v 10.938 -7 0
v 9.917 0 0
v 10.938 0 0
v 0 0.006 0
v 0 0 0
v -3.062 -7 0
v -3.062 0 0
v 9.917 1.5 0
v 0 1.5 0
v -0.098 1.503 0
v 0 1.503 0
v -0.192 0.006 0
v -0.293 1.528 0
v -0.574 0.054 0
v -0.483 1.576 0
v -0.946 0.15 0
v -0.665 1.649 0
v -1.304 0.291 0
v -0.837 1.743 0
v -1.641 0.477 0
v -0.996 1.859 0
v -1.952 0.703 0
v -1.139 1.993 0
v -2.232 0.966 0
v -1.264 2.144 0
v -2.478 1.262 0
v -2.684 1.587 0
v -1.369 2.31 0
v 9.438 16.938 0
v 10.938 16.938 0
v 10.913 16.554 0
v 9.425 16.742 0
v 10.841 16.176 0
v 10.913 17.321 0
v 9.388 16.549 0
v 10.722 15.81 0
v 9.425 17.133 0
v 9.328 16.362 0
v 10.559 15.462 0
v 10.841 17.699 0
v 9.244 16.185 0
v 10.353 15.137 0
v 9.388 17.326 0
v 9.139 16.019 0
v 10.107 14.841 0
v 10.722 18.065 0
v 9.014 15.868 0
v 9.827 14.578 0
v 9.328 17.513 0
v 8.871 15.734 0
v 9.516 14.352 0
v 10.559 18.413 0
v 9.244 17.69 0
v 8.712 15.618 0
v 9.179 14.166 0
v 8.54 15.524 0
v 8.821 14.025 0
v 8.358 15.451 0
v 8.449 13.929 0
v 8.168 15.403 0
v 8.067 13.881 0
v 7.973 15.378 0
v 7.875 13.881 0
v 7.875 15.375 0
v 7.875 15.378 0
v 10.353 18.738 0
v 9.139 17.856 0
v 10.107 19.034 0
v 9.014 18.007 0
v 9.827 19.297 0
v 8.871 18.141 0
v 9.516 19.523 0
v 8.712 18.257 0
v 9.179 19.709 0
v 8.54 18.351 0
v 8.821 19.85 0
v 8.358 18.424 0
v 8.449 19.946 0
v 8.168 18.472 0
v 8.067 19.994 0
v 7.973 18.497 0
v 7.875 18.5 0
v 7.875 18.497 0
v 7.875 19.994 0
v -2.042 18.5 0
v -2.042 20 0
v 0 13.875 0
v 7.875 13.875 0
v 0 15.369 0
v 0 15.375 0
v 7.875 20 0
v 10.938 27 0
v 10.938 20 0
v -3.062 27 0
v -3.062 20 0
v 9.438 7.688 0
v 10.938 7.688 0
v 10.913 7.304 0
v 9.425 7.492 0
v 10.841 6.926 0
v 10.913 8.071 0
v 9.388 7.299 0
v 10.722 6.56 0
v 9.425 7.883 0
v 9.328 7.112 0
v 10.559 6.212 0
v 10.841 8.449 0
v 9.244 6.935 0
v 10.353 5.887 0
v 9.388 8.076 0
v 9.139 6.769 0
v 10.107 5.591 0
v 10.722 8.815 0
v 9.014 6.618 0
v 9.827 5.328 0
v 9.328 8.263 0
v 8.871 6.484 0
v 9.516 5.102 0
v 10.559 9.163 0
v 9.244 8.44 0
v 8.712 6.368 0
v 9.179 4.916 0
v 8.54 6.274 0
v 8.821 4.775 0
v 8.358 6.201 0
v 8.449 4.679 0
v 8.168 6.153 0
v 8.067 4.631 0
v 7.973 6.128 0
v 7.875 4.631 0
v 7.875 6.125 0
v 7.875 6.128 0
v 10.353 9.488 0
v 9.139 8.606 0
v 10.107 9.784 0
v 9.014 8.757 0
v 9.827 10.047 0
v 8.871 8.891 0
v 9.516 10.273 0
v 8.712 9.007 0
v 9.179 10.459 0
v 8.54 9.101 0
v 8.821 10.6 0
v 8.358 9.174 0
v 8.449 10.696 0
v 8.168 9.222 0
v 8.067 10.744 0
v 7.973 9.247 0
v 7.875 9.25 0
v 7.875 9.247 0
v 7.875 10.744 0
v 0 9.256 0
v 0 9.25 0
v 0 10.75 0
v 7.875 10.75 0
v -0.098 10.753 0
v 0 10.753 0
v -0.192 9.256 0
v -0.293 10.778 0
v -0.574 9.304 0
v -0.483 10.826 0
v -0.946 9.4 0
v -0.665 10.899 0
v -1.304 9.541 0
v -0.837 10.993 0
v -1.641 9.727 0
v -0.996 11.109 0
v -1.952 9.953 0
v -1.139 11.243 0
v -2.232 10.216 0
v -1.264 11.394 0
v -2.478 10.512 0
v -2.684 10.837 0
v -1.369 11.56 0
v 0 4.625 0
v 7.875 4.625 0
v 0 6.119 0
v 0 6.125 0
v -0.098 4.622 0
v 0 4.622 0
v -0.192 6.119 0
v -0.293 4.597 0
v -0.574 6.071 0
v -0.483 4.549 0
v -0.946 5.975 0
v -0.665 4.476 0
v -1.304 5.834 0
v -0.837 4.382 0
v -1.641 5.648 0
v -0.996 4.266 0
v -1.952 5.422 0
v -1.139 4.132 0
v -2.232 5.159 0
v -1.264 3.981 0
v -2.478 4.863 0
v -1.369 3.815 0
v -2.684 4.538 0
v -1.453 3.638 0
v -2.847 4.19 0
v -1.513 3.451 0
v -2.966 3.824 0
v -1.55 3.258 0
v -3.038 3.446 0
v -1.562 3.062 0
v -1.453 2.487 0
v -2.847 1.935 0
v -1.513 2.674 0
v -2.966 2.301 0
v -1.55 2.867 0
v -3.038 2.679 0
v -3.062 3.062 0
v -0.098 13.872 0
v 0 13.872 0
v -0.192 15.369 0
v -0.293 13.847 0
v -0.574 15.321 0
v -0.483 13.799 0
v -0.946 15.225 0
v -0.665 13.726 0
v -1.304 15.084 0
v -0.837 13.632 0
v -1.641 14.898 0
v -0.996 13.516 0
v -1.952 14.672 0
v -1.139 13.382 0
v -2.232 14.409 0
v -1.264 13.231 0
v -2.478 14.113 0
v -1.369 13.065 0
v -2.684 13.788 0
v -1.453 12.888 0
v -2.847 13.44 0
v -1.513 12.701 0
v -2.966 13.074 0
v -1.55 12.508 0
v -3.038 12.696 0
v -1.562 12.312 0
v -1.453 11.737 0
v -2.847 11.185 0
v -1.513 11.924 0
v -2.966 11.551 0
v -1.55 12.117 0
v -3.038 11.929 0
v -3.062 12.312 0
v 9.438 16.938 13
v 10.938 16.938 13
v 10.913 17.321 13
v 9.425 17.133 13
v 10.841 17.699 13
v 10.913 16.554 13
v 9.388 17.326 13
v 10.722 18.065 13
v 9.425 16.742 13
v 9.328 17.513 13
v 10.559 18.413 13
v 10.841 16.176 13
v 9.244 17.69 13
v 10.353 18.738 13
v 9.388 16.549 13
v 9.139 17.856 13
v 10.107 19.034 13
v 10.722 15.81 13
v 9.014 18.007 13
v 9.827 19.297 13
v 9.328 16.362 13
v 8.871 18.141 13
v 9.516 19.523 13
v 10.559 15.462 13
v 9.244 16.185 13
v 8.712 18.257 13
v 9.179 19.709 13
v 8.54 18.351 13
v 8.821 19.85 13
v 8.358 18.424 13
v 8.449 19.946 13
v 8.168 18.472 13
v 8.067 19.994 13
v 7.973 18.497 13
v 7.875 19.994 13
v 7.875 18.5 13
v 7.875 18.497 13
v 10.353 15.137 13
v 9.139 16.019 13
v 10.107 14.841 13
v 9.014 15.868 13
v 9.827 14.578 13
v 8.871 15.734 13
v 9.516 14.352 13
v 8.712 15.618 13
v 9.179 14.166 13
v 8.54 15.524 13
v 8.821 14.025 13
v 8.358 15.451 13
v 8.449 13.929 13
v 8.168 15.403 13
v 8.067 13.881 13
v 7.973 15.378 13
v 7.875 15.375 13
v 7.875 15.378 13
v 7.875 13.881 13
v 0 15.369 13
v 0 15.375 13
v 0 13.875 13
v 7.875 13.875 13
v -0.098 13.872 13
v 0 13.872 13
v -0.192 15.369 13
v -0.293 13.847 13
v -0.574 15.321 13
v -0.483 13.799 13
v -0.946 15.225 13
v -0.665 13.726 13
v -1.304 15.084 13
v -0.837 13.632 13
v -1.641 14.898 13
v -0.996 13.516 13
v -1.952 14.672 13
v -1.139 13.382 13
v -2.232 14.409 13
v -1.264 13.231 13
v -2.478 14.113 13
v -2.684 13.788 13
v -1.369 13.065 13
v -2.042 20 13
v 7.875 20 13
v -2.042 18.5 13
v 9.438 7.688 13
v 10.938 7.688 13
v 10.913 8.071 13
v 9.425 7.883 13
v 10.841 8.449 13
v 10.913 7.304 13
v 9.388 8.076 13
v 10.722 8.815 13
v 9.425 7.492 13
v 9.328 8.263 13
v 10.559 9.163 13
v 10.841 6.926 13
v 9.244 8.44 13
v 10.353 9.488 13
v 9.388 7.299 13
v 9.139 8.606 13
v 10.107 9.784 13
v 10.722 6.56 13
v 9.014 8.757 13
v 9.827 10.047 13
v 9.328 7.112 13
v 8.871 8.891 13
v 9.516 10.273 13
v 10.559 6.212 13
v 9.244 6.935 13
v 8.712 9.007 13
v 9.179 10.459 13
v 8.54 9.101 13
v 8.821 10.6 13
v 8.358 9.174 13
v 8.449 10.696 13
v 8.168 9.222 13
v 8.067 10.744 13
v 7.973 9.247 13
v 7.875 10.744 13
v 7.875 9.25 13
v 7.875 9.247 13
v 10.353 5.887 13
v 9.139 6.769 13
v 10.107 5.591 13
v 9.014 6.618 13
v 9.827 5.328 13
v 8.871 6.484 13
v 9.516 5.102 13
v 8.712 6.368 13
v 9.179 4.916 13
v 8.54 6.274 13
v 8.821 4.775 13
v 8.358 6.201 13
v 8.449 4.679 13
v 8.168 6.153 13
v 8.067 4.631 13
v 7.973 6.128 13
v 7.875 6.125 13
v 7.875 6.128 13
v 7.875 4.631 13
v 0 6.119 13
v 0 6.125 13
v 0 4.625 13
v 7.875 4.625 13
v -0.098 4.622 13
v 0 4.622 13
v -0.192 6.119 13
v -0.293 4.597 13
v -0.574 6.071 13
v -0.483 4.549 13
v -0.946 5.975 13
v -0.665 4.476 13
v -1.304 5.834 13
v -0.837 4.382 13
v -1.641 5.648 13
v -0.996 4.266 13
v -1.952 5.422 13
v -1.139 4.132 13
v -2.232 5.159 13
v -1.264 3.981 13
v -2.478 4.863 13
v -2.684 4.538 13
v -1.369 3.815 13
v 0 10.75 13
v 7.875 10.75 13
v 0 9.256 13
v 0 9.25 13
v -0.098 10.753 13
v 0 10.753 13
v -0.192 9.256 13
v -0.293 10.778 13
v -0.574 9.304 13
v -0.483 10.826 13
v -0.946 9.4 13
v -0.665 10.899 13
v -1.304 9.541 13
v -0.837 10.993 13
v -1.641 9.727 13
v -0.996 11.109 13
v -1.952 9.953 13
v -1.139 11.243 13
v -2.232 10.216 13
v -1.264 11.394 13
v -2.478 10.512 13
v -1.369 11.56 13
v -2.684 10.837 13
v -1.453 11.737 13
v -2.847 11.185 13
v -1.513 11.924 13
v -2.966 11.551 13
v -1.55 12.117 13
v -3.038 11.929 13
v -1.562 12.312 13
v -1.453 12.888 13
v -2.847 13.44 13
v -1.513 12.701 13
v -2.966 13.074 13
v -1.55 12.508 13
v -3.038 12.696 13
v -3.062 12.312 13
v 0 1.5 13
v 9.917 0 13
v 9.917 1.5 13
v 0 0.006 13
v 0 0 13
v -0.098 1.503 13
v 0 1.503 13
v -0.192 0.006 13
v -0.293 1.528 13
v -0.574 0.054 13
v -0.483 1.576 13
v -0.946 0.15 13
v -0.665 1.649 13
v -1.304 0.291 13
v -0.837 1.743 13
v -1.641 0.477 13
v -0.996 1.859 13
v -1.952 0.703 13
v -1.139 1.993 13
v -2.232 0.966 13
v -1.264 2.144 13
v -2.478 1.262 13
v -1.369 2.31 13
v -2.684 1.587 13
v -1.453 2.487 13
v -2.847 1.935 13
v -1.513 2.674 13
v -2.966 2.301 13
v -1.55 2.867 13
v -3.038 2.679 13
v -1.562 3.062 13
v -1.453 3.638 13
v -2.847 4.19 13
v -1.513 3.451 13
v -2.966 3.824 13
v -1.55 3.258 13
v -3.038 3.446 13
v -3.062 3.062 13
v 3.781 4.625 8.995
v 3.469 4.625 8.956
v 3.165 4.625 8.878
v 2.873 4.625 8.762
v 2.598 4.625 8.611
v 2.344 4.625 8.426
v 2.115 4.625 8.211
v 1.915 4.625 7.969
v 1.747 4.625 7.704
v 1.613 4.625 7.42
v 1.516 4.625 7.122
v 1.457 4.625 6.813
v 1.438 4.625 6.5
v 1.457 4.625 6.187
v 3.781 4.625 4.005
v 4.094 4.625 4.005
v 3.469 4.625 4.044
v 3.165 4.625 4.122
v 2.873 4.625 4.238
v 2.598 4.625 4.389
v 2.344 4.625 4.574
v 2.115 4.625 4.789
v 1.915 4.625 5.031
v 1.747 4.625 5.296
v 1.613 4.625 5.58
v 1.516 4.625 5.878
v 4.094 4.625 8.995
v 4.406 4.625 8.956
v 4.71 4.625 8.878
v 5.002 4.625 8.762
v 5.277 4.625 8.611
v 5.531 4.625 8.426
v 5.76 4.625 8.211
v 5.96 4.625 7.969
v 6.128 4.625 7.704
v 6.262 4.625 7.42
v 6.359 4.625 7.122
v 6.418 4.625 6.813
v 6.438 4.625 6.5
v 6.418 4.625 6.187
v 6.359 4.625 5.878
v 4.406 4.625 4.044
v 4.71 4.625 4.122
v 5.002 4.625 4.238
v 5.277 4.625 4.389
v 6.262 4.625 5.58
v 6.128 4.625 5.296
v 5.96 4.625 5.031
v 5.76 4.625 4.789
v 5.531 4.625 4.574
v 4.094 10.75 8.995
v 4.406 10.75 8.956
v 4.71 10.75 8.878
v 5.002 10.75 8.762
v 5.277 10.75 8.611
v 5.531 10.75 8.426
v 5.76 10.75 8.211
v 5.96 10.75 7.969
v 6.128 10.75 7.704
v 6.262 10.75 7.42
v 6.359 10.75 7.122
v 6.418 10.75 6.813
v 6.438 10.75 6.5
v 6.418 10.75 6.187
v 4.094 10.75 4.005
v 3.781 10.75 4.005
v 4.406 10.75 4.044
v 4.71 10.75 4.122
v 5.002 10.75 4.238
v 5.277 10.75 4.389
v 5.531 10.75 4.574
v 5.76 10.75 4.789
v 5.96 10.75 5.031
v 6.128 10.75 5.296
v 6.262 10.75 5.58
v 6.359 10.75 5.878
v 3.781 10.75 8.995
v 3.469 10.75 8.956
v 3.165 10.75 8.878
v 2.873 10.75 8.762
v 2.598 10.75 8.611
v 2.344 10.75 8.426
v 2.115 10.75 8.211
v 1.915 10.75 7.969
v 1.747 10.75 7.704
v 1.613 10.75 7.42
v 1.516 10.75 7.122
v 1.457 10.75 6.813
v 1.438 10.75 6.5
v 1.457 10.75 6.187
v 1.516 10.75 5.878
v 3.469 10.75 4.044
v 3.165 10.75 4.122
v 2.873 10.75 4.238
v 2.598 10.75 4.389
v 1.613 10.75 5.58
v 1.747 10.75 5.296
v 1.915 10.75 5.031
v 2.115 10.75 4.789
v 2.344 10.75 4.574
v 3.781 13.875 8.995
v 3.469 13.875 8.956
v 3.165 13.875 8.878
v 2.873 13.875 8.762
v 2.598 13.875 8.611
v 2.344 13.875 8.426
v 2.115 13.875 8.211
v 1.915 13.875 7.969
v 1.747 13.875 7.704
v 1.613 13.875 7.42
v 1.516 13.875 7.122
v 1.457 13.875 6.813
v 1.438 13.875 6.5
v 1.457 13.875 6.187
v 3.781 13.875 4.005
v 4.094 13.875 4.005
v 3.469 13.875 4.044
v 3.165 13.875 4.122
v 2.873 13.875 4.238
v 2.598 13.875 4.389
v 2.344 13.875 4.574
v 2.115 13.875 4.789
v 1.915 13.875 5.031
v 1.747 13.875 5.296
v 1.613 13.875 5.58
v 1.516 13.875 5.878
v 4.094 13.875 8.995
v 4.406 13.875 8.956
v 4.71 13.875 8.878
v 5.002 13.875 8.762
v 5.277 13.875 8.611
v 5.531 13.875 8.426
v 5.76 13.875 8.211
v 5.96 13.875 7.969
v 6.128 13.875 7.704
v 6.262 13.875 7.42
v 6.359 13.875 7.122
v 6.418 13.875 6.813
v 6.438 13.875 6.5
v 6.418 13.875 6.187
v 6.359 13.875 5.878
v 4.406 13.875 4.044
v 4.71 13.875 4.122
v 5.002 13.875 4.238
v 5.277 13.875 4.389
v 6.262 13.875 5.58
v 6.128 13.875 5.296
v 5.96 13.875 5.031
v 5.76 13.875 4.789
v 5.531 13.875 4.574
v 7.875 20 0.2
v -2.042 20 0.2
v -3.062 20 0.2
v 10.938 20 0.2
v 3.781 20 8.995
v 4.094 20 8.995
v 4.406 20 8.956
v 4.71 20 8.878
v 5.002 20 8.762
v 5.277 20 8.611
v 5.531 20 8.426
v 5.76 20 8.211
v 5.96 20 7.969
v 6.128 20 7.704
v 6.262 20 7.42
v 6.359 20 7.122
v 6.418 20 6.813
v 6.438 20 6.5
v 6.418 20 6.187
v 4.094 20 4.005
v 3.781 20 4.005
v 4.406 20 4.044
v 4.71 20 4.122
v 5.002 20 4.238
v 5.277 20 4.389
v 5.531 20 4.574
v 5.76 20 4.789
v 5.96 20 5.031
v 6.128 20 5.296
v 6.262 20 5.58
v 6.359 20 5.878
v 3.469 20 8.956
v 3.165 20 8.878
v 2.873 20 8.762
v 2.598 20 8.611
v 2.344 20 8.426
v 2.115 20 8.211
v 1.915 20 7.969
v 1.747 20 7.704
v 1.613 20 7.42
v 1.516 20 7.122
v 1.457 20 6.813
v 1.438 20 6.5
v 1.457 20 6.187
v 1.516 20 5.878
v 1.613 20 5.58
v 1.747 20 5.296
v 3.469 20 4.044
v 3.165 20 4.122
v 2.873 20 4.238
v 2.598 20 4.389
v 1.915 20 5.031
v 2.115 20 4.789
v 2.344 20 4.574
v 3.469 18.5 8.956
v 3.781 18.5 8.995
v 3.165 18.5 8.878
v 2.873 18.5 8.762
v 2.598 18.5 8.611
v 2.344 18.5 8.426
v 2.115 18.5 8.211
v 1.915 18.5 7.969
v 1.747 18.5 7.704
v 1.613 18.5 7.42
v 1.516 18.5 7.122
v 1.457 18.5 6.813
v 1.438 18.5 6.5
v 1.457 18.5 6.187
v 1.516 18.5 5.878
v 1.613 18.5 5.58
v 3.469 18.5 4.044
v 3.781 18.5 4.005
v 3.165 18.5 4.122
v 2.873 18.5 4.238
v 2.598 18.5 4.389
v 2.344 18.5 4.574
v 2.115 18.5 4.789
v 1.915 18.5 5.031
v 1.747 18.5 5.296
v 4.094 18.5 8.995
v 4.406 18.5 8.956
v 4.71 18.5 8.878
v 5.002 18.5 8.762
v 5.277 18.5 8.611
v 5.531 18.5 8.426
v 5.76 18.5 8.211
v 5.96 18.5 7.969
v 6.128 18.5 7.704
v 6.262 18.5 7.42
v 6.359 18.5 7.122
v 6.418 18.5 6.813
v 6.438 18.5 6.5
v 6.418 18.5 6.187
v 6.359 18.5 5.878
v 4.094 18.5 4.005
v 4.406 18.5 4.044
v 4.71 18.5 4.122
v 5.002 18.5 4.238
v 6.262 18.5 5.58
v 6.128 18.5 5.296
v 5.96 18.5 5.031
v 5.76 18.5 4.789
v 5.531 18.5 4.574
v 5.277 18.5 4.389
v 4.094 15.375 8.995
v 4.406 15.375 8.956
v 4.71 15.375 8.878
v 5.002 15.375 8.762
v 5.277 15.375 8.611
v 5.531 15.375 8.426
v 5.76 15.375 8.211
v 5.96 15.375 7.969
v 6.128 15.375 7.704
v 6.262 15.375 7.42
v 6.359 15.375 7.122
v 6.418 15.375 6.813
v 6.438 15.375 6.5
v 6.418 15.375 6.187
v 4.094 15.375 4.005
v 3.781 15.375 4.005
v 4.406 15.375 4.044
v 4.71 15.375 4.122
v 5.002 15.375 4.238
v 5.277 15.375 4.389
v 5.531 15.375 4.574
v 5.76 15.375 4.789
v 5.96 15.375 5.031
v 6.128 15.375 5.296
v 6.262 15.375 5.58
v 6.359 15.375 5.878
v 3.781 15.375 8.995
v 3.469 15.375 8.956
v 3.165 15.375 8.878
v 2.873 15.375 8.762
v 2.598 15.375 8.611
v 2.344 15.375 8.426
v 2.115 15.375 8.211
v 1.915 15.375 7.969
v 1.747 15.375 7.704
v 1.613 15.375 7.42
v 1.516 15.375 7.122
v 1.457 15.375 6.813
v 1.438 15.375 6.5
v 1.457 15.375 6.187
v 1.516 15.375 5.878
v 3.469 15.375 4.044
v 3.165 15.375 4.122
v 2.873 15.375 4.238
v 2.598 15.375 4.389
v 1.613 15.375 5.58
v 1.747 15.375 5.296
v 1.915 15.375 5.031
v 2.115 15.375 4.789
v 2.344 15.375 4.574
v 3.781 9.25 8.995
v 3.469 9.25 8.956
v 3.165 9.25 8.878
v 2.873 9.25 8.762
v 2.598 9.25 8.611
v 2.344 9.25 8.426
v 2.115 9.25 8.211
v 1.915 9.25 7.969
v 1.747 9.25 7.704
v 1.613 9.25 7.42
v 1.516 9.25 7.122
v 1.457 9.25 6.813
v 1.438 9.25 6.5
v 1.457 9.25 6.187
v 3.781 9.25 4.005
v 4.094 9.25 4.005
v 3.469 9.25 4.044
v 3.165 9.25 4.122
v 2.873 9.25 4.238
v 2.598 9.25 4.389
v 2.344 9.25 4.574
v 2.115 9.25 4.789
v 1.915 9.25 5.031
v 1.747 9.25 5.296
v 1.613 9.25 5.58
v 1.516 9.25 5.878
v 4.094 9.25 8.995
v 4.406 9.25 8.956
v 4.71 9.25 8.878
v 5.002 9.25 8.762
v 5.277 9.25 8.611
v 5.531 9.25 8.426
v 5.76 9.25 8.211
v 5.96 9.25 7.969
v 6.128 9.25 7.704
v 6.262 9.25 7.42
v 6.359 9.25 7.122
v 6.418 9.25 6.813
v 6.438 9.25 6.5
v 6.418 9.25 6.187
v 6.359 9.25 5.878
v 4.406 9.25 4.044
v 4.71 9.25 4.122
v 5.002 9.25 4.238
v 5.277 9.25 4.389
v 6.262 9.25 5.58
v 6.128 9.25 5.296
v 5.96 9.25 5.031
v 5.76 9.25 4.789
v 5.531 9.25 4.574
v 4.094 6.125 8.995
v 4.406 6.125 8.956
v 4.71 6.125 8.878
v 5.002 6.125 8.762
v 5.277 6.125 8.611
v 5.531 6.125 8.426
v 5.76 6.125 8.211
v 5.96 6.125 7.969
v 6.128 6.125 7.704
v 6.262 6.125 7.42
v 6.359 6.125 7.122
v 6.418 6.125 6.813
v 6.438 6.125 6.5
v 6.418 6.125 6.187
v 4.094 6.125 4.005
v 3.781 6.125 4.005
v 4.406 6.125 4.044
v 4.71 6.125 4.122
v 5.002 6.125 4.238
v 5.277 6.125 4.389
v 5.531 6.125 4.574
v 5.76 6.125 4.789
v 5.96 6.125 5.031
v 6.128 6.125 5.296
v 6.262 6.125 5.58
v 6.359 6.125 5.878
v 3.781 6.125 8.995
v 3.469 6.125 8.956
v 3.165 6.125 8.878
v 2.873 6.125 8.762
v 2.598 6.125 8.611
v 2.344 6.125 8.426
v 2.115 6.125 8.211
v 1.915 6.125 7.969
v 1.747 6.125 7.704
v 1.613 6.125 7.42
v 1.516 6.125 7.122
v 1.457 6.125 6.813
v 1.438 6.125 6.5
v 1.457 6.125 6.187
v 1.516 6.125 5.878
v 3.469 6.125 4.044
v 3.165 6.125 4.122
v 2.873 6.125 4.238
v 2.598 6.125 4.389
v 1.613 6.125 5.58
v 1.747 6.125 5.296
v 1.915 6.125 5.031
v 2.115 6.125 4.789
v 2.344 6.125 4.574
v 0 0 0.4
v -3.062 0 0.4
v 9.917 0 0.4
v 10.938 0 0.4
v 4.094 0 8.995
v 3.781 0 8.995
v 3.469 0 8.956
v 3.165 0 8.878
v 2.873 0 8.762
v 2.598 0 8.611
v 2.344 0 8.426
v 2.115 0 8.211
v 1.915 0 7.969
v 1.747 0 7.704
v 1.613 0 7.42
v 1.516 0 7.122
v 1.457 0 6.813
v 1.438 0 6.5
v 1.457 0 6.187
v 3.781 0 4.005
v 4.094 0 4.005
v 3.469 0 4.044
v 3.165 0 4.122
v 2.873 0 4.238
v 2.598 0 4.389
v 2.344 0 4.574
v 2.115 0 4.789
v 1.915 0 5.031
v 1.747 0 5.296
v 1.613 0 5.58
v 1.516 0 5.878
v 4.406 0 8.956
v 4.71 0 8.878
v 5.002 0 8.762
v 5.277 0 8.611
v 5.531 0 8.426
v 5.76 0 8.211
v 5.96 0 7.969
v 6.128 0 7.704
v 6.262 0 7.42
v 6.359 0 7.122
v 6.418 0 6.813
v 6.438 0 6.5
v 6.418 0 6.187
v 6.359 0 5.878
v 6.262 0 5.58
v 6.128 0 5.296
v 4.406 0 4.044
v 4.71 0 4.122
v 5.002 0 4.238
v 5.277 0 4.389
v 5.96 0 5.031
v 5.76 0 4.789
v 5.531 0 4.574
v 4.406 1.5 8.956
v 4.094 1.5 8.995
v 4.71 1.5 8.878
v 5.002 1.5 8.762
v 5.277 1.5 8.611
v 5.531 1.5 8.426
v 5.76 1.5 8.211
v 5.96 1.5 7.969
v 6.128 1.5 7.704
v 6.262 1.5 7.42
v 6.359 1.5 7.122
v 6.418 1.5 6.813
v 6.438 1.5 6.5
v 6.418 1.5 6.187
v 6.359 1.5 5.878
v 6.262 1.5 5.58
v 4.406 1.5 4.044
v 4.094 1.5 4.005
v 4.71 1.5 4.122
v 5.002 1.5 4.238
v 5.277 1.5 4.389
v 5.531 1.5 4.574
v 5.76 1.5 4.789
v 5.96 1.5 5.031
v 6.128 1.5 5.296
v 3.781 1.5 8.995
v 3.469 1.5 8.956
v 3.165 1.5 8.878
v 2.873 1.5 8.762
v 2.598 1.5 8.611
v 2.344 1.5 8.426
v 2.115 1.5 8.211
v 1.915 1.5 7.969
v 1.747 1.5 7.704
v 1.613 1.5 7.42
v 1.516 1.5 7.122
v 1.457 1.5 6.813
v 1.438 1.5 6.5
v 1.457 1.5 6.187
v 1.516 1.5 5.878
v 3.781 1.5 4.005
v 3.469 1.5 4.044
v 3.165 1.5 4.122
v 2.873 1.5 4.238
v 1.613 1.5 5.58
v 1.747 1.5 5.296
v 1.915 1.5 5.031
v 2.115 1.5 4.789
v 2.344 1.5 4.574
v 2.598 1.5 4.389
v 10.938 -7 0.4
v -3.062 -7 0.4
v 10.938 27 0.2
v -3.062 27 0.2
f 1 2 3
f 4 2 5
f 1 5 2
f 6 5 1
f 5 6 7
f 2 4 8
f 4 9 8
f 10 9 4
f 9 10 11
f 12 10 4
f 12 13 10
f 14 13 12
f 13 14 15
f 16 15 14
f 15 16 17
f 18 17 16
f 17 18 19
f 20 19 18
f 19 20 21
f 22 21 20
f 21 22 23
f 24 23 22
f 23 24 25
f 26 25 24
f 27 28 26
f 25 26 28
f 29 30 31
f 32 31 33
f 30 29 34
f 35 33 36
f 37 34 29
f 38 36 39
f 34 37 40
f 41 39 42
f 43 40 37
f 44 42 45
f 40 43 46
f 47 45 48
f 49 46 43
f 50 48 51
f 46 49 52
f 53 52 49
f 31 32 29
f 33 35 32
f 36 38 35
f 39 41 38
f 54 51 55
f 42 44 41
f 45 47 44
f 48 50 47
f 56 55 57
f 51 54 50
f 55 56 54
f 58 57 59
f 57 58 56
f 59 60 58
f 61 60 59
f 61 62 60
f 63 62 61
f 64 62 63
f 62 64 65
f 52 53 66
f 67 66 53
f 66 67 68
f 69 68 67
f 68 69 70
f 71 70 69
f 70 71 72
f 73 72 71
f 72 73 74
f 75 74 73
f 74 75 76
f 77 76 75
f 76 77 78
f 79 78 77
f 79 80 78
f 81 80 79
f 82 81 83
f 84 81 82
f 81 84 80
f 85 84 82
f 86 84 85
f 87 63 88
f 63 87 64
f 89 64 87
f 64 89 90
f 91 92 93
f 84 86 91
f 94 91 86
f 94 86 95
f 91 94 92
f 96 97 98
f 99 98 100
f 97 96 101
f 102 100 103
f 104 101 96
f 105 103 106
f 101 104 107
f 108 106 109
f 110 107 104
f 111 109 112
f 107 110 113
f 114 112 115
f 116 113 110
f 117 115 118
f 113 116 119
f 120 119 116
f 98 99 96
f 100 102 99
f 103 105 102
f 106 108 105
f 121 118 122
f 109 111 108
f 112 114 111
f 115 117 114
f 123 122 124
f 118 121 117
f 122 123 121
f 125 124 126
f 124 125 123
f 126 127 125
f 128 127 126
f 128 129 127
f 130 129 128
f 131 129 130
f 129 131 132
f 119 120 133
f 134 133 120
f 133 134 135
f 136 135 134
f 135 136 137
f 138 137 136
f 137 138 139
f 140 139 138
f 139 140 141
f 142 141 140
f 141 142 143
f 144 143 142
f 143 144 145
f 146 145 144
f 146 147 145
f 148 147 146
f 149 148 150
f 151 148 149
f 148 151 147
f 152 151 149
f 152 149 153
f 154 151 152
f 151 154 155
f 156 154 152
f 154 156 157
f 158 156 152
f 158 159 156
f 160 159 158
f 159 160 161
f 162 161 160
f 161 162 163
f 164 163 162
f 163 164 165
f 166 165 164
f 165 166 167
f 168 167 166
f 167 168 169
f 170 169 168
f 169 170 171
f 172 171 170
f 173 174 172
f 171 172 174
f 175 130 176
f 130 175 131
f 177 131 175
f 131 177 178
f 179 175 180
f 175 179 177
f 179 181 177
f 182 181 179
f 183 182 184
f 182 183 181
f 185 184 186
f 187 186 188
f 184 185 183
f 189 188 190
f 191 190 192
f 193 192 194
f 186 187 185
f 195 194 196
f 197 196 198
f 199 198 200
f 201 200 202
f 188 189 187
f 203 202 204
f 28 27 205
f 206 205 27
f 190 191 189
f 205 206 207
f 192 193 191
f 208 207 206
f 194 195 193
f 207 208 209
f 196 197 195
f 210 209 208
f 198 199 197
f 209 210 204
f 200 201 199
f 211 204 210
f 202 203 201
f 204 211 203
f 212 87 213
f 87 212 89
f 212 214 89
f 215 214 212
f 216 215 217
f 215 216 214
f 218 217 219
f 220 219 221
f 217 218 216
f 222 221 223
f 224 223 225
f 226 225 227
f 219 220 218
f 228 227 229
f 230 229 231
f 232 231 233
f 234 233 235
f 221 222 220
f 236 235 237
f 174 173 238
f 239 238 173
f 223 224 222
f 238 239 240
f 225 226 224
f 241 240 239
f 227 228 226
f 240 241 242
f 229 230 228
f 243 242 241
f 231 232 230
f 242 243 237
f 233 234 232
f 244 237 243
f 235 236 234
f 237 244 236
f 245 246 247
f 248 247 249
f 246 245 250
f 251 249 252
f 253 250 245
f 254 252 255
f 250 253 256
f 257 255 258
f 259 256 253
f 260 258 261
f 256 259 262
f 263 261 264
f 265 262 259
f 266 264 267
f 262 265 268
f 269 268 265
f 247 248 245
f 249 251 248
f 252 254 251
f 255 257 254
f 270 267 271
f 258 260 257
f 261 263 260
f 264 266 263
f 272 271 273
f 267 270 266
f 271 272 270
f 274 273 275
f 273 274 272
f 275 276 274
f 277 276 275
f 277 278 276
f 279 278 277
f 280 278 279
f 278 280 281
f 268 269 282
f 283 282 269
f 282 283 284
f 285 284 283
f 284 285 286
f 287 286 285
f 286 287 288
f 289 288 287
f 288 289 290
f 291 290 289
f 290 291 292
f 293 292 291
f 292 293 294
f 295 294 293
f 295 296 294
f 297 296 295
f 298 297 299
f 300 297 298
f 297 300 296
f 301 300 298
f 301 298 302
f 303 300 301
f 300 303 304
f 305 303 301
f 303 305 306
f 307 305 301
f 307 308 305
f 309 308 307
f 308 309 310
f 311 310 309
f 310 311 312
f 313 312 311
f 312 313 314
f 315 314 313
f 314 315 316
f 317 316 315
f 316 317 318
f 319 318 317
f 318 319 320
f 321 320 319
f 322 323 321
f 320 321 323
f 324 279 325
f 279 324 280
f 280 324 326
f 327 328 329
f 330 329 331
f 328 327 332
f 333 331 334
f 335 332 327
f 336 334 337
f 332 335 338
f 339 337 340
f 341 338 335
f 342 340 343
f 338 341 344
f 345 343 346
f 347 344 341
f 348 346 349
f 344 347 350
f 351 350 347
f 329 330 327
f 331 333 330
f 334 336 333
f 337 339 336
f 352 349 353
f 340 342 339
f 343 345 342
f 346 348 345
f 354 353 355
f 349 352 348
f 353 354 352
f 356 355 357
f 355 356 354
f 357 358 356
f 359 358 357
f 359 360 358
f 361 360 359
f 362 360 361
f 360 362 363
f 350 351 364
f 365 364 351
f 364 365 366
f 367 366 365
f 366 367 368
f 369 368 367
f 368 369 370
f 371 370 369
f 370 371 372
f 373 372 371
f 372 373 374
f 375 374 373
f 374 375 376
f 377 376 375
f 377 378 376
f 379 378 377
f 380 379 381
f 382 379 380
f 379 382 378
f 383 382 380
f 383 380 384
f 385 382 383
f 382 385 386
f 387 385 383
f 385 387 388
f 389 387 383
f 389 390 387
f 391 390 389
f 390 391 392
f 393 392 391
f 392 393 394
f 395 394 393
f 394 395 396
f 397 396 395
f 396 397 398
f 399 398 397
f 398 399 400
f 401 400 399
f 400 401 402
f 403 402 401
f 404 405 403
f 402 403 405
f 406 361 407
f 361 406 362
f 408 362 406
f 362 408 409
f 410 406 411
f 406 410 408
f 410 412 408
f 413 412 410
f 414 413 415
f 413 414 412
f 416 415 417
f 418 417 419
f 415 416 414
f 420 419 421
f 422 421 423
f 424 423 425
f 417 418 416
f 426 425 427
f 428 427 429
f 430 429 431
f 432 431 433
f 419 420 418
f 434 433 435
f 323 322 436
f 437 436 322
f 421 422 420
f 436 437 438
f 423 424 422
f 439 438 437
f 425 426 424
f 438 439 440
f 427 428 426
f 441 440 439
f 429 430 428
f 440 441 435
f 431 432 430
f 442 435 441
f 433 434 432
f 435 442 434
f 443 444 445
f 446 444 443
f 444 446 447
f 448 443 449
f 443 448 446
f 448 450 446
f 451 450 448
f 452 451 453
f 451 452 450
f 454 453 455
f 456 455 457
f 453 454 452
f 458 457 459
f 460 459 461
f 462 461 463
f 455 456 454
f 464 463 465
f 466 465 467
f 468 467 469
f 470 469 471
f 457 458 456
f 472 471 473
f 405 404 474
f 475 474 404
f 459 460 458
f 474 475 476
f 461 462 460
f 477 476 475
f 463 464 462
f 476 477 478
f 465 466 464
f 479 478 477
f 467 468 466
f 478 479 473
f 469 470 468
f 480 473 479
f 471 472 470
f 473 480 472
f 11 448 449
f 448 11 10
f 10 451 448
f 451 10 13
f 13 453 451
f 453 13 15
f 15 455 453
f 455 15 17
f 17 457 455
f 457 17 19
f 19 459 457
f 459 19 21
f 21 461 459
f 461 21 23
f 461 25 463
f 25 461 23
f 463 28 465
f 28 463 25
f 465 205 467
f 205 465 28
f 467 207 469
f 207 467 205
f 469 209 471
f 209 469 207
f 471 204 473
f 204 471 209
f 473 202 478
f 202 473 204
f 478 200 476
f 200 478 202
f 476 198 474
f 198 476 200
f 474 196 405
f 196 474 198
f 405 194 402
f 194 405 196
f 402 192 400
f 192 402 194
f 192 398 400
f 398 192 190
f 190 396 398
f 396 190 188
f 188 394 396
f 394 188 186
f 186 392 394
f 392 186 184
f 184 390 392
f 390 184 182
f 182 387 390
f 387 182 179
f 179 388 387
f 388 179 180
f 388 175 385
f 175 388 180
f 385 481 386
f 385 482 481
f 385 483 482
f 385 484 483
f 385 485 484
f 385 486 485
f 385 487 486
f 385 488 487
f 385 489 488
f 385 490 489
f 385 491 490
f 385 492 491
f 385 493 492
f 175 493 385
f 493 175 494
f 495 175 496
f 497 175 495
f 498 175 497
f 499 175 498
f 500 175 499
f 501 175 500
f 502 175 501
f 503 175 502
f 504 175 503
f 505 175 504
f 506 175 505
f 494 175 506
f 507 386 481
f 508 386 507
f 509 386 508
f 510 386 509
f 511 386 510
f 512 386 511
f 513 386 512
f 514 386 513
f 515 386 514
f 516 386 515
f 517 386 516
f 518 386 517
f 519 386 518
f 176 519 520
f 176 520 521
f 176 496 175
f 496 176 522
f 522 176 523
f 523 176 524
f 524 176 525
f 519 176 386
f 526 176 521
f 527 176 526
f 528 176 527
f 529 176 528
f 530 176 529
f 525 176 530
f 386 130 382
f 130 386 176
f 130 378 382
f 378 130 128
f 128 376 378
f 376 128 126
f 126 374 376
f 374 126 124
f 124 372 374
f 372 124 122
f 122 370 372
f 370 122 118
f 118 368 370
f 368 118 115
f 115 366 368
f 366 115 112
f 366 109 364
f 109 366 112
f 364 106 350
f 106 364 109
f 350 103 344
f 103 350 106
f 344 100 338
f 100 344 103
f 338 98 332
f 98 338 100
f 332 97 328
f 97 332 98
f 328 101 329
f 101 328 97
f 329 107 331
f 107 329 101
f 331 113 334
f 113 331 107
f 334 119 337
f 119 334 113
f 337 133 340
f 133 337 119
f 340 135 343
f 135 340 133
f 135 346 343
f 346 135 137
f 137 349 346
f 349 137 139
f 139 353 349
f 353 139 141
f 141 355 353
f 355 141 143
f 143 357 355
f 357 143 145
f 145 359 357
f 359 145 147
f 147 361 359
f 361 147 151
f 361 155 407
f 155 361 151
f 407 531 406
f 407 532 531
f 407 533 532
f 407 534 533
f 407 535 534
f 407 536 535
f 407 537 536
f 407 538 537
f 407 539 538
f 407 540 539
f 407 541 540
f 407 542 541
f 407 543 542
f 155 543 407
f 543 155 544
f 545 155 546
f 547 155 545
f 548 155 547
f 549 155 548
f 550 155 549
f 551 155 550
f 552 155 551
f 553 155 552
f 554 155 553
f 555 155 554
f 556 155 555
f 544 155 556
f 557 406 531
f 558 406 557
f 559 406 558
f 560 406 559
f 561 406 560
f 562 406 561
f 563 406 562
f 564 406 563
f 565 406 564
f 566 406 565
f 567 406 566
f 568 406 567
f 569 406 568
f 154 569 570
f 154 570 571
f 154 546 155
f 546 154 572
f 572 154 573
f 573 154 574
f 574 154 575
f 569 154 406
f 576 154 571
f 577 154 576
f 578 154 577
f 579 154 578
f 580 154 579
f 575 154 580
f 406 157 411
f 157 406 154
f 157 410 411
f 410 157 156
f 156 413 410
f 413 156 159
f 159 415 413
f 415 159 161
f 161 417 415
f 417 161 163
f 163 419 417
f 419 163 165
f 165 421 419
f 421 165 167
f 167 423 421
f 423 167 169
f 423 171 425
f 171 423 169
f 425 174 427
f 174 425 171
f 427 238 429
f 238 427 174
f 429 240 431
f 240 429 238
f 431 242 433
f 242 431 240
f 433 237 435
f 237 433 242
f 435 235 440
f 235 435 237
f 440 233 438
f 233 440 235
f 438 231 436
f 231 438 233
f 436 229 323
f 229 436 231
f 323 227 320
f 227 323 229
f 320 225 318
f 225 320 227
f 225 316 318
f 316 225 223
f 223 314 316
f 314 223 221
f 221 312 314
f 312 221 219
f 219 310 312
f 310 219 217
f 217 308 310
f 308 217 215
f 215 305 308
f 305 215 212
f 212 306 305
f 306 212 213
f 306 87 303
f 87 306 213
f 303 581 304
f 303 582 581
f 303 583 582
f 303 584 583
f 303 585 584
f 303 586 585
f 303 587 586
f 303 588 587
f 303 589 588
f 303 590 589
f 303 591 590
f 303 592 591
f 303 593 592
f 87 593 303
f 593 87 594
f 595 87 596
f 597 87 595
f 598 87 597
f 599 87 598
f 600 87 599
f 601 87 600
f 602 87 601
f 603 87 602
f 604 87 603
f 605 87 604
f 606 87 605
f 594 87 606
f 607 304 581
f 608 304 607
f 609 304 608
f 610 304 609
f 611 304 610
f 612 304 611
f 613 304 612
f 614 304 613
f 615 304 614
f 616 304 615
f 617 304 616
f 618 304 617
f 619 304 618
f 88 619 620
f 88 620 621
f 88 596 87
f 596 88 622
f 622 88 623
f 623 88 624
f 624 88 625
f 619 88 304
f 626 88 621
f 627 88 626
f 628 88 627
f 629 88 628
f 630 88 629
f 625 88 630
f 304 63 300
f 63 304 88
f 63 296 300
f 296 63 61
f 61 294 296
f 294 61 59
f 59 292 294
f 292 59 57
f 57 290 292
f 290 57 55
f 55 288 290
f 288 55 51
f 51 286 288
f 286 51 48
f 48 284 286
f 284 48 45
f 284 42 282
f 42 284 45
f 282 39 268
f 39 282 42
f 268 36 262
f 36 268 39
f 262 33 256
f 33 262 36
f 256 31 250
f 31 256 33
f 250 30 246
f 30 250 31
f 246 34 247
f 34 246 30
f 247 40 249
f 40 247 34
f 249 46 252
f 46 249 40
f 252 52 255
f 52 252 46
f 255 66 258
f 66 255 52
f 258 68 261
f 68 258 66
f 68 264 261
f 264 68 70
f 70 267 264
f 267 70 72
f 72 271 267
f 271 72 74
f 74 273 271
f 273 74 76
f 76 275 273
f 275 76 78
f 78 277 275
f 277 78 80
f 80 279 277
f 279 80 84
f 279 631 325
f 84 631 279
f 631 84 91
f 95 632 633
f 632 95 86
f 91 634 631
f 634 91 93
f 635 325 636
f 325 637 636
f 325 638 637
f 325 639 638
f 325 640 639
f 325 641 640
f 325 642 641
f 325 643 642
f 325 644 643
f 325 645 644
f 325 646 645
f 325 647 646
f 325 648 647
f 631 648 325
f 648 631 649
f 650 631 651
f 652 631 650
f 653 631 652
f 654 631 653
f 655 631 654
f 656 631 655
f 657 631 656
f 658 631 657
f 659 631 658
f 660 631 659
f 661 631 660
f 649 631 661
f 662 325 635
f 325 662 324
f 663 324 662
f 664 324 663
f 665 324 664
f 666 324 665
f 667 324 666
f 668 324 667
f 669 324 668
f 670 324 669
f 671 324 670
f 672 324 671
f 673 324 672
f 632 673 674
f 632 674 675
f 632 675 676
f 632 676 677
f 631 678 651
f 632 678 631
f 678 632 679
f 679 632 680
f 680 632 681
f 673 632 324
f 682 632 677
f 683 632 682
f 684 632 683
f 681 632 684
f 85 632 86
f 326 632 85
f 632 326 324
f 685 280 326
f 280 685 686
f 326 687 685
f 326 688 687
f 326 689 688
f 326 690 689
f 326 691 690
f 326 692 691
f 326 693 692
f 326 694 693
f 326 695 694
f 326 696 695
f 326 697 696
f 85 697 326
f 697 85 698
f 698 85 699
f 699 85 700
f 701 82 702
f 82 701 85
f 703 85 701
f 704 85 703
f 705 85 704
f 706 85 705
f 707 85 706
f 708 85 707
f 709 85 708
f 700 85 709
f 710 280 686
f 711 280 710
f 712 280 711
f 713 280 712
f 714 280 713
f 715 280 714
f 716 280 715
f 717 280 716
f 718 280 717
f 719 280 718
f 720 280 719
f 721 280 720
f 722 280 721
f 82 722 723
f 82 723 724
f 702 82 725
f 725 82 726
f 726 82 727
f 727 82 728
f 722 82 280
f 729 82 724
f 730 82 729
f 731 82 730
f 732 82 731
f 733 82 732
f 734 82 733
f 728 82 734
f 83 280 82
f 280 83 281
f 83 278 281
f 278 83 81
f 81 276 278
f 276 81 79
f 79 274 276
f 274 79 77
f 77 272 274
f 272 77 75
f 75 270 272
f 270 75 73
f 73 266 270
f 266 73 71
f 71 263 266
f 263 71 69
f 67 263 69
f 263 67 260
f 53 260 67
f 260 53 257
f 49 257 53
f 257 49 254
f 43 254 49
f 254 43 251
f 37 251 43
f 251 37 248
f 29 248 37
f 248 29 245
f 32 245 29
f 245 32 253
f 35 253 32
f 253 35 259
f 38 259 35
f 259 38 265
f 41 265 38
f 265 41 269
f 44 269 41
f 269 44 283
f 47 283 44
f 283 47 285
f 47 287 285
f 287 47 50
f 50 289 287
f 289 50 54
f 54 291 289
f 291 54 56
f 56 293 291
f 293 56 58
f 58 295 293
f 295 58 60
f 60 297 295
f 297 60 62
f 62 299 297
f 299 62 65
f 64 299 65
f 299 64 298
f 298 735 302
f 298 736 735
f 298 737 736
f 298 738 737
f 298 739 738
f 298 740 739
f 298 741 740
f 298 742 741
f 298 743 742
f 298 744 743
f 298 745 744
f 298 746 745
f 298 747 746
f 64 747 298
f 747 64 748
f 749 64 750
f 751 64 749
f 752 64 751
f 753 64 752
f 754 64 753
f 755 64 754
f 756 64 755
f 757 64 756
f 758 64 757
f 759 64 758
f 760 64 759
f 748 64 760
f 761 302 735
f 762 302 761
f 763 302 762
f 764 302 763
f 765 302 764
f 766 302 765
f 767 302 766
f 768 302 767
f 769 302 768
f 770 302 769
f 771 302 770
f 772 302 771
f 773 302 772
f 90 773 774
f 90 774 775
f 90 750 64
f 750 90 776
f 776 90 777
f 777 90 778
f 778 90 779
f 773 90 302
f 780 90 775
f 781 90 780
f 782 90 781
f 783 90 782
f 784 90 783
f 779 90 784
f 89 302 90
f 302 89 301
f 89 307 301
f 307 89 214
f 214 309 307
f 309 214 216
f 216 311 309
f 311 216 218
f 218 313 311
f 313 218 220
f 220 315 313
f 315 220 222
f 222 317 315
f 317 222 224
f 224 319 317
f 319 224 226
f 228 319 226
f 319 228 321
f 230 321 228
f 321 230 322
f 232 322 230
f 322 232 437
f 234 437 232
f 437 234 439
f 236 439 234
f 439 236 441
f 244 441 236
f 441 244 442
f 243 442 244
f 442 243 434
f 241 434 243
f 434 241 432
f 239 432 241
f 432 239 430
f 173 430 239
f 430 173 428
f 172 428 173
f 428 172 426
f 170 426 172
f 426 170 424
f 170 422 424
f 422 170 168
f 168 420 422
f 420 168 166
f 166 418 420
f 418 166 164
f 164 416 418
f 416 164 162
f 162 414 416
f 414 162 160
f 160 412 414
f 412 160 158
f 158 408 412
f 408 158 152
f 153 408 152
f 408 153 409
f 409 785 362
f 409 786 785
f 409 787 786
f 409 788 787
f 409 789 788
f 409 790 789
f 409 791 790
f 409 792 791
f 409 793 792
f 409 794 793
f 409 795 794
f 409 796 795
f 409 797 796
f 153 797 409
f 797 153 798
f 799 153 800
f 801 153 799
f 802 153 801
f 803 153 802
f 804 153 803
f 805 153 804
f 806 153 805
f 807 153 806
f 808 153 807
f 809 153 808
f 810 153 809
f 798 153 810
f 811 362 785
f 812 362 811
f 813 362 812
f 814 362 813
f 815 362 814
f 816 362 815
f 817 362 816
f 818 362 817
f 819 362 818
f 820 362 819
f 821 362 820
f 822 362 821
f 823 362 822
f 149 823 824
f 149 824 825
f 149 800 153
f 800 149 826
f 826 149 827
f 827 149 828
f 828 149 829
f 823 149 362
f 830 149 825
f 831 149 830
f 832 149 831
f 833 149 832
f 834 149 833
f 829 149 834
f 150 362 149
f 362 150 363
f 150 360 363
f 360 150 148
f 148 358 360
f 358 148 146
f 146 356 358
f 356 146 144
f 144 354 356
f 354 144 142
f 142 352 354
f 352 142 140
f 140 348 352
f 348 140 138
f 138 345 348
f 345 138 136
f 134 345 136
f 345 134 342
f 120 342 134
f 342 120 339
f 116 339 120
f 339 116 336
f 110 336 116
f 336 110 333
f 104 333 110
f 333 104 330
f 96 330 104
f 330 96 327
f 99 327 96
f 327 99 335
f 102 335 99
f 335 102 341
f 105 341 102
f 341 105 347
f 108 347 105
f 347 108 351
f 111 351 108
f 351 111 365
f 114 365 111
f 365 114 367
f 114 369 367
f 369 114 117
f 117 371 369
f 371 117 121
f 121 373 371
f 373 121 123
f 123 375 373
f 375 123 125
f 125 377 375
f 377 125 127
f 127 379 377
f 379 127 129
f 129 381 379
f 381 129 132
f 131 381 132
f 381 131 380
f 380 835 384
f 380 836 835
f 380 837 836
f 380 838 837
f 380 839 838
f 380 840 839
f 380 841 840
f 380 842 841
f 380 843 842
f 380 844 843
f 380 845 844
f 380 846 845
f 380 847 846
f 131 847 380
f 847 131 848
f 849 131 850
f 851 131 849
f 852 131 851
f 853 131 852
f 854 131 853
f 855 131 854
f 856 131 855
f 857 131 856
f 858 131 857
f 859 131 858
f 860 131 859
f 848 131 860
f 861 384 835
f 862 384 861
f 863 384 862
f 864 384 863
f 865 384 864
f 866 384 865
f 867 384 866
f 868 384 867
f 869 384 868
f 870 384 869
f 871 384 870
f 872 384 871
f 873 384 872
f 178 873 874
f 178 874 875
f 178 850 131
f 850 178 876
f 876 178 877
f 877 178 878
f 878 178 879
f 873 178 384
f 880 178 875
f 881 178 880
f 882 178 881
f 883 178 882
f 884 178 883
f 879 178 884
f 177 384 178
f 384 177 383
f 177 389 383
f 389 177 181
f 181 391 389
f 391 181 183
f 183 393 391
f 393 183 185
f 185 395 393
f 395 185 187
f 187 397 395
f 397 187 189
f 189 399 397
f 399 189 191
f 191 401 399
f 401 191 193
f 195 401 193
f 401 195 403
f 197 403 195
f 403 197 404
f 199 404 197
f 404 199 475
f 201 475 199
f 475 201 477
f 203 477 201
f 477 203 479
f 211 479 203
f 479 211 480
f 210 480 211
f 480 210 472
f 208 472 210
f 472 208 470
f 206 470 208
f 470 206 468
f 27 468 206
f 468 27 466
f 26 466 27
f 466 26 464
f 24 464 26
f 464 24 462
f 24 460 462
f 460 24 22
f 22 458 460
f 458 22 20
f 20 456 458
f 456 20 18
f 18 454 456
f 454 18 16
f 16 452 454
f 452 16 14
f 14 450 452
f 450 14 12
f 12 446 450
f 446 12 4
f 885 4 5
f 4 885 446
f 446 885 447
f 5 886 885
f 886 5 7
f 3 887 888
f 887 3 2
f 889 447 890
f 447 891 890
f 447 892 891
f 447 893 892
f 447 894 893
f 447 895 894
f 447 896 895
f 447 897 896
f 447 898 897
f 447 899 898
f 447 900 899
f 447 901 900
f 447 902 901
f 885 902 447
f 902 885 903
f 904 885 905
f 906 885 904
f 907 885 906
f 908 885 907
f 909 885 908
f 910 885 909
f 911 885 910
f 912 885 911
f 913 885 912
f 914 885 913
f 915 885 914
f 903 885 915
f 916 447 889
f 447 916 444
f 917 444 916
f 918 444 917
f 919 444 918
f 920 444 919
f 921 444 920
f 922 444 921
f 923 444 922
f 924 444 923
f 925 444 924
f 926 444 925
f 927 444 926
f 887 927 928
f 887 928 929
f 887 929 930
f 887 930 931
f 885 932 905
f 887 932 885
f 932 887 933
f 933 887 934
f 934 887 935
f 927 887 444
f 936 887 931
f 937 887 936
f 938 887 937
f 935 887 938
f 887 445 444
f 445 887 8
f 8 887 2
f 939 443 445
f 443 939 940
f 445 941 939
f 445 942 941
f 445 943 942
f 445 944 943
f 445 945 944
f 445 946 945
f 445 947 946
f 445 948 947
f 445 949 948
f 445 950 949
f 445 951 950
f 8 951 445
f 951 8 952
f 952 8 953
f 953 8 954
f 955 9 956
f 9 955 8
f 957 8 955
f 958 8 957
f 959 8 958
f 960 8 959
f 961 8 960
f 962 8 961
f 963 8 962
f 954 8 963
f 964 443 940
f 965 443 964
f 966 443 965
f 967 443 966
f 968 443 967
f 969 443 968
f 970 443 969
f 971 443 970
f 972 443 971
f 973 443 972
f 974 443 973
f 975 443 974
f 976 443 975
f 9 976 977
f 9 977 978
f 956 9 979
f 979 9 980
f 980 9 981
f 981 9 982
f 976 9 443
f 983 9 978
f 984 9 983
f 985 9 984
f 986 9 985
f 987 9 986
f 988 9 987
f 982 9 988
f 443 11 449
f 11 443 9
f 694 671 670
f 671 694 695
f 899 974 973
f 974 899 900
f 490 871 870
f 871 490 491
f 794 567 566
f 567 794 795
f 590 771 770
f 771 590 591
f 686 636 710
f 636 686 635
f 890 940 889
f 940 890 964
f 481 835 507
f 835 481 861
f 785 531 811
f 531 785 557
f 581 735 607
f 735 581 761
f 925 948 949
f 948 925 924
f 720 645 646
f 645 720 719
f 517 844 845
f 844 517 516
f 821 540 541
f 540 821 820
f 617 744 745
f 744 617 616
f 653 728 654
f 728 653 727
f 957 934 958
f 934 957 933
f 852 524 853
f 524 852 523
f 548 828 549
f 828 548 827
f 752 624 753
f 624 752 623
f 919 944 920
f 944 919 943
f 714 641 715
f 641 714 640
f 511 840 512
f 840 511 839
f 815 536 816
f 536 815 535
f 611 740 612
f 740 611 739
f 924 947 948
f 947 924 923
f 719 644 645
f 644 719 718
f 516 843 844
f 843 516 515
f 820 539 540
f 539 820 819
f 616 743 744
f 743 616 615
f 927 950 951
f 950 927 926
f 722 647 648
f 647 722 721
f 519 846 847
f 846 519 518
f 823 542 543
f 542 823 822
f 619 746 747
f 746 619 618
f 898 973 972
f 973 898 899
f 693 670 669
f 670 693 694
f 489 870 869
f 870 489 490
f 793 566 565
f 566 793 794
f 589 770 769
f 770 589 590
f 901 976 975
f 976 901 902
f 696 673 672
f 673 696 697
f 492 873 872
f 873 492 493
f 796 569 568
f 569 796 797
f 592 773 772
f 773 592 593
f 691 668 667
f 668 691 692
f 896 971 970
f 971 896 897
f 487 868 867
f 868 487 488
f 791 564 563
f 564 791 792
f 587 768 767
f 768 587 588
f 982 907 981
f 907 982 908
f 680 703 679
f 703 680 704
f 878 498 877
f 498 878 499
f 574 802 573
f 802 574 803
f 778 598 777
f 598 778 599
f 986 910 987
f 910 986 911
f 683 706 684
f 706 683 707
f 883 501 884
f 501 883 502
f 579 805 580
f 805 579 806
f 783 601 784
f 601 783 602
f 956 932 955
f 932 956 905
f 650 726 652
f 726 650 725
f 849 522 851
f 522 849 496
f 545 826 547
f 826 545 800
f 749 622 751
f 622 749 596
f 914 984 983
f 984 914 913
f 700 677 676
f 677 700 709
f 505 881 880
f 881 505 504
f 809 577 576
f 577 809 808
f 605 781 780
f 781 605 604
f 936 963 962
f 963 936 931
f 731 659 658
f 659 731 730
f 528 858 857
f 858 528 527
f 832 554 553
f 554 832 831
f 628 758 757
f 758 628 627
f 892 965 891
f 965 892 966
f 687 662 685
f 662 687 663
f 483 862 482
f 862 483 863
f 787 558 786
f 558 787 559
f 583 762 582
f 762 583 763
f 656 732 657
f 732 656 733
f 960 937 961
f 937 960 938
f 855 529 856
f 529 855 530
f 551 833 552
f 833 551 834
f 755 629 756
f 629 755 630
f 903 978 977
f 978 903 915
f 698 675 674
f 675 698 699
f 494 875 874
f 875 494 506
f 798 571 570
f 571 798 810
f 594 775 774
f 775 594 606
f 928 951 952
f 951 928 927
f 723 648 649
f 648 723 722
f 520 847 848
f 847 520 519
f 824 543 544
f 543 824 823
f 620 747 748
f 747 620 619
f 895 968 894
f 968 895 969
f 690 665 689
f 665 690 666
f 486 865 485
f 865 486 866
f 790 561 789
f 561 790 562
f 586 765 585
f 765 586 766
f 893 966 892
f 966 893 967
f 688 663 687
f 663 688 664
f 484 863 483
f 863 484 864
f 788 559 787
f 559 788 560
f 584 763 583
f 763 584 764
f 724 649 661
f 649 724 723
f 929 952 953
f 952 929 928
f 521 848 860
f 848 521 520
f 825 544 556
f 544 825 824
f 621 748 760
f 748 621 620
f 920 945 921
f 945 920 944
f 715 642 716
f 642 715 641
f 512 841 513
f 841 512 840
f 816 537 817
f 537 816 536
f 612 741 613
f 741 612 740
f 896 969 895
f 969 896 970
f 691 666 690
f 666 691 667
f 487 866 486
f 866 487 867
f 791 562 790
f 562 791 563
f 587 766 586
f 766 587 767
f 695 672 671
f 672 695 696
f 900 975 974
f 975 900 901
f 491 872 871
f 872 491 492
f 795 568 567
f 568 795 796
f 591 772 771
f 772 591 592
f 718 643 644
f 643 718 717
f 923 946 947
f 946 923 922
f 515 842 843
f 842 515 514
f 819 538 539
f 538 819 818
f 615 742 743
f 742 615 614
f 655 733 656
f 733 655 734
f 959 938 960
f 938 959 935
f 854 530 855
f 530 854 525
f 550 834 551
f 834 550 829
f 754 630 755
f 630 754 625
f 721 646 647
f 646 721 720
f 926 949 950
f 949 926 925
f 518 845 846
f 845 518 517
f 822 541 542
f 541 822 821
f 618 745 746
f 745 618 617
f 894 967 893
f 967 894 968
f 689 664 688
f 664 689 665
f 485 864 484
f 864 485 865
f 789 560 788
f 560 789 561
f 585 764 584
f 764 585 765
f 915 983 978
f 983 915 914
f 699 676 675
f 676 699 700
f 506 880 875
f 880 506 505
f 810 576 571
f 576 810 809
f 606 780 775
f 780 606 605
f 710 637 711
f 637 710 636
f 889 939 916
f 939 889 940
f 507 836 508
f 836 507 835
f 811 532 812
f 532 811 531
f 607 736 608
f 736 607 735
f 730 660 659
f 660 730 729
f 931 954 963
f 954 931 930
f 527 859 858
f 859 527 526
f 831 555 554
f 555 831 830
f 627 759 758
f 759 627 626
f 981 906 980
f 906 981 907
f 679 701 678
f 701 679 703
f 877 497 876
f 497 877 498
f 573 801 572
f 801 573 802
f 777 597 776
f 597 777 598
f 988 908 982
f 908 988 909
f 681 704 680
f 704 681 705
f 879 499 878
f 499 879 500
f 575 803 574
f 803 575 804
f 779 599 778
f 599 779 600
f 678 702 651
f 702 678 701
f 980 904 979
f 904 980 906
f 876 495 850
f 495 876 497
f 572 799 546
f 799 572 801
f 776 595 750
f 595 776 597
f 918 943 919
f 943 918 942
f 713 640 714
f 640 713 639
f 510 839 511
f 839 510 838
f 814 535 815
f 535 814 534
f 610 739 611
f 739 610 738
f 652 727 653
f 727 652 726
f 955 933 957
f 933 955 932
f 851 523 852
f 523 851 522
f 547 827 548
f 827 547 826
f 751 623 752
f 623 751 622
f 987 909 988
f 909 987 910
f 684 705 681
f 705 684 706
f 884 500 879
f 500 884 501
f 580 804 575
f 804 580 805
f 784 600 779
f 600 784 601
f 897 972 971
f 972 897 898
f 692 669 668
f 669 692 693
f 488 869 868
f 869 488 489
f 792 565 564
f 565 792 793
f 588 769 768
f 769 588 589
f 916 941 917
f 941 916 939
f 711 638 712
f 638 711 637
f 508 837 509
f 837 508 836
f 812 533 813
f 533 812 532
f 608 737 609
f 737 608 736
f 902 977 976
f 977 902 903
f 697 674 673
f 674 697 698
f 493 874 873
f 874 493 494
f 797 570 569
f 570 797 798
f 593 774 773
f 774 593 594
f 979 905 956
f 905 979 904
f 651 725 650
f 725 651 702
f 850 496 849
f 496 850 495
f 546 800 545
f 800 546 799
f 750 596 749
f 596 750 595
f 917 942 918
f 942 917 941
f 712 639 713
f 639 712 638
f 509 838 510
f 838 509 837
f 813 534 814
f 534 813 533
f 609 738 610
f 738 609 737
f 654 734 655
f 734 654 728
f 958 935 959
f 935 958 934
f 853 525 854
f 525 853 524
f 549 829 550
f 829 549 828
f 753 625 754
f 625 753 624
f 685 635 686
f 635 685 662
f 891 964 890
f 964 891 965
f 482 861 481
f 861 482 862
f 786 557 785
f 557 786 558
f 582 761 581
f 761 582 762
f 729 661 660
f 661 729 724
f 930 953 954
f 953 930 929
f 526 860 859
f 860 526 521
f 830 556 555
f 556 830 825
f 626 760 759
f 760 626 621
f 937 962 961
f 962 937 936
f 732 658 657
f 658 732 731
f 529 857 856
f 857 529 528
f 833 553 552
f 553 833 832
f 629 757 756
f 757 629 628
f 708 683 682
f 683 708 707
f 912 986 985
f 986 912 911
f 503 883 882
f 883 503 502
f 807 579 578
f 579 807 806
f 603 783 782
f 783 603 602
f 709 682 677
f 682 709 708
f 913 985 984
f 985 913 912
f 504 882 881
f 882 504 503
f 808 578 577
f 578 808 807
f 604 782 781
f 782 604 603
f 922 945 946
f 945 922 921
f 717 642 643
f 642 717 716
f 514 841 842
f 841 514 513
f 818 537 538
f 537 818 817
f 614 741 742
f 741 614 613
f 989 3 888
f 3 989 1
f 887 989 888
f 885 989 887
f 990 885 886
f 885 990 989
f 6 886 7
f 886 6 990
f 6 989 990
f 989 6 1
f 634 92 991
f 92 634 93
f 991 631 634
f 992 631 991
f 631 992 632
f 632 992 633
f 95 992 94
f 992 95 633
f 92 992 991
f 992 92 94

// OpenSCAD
// simple spring Glyn Cowles June 2018
// Internal hole for bolt
holeDiam=5; 
// Width of spring
width=14;
// Height of spring
height=13; 
// Thickness
th=1.5; 
// Overall length
length=20; 
// Number of links
n=2; 
// Add extra flaps at ends to aid adhesion
brim=1; // [1:True,0:False]
// Resolution
$fn=50; 

cDiam=(length+(2*n-1)*th)/(2*n);
echo (cDiam);
connector=width-cDiam;
//--------------------------------------------------------------
difference() {
    linear_extrude(height) main();
    #translate([connector/2,0,height/2]) rotate([90,0,180]) cylinder(d=holeDiam,h=length);
}
if (brim) {
translate([-cDiam/2,-width/2,0]) cube([width,width/2,.4]);
translate([-cDiam/2,length,0]) cube([width,width/2,.2]);
}
//--------------------------------------------------------------
module main() { 
for (i=[0:n-1]) {
translate([0,i*((cDiam-th)*2)+cDiam/2]) link1();
}
eb=cDiam/3; // extra bit
translate([-eb,(n)*(cDiam-th)*2]) square([connector+eb,th]);
translate([0,0]) square([connector+eb,th]);
}
//--------------------------------------------------------------
module halfCircle(diameter, th) {
	difference(){
		circle(d = diameter);
		circle(d = diameter - th*2);
        translate([0,-diameter/2-th/2]) square([diameter,diameter+th]);
	}
}
//--------------------------------------------------------------
module link0() {
    halfCircle(cDiam,th);
    translate([0,-cDiam/2]) square([connector,th]);

}
//--------------------------------------------------------------
module link1() {
    link0();
    translate([connector,cDiam-th])rotate([180,0,180])  link0();
}
//--------------------------------------------------------------
